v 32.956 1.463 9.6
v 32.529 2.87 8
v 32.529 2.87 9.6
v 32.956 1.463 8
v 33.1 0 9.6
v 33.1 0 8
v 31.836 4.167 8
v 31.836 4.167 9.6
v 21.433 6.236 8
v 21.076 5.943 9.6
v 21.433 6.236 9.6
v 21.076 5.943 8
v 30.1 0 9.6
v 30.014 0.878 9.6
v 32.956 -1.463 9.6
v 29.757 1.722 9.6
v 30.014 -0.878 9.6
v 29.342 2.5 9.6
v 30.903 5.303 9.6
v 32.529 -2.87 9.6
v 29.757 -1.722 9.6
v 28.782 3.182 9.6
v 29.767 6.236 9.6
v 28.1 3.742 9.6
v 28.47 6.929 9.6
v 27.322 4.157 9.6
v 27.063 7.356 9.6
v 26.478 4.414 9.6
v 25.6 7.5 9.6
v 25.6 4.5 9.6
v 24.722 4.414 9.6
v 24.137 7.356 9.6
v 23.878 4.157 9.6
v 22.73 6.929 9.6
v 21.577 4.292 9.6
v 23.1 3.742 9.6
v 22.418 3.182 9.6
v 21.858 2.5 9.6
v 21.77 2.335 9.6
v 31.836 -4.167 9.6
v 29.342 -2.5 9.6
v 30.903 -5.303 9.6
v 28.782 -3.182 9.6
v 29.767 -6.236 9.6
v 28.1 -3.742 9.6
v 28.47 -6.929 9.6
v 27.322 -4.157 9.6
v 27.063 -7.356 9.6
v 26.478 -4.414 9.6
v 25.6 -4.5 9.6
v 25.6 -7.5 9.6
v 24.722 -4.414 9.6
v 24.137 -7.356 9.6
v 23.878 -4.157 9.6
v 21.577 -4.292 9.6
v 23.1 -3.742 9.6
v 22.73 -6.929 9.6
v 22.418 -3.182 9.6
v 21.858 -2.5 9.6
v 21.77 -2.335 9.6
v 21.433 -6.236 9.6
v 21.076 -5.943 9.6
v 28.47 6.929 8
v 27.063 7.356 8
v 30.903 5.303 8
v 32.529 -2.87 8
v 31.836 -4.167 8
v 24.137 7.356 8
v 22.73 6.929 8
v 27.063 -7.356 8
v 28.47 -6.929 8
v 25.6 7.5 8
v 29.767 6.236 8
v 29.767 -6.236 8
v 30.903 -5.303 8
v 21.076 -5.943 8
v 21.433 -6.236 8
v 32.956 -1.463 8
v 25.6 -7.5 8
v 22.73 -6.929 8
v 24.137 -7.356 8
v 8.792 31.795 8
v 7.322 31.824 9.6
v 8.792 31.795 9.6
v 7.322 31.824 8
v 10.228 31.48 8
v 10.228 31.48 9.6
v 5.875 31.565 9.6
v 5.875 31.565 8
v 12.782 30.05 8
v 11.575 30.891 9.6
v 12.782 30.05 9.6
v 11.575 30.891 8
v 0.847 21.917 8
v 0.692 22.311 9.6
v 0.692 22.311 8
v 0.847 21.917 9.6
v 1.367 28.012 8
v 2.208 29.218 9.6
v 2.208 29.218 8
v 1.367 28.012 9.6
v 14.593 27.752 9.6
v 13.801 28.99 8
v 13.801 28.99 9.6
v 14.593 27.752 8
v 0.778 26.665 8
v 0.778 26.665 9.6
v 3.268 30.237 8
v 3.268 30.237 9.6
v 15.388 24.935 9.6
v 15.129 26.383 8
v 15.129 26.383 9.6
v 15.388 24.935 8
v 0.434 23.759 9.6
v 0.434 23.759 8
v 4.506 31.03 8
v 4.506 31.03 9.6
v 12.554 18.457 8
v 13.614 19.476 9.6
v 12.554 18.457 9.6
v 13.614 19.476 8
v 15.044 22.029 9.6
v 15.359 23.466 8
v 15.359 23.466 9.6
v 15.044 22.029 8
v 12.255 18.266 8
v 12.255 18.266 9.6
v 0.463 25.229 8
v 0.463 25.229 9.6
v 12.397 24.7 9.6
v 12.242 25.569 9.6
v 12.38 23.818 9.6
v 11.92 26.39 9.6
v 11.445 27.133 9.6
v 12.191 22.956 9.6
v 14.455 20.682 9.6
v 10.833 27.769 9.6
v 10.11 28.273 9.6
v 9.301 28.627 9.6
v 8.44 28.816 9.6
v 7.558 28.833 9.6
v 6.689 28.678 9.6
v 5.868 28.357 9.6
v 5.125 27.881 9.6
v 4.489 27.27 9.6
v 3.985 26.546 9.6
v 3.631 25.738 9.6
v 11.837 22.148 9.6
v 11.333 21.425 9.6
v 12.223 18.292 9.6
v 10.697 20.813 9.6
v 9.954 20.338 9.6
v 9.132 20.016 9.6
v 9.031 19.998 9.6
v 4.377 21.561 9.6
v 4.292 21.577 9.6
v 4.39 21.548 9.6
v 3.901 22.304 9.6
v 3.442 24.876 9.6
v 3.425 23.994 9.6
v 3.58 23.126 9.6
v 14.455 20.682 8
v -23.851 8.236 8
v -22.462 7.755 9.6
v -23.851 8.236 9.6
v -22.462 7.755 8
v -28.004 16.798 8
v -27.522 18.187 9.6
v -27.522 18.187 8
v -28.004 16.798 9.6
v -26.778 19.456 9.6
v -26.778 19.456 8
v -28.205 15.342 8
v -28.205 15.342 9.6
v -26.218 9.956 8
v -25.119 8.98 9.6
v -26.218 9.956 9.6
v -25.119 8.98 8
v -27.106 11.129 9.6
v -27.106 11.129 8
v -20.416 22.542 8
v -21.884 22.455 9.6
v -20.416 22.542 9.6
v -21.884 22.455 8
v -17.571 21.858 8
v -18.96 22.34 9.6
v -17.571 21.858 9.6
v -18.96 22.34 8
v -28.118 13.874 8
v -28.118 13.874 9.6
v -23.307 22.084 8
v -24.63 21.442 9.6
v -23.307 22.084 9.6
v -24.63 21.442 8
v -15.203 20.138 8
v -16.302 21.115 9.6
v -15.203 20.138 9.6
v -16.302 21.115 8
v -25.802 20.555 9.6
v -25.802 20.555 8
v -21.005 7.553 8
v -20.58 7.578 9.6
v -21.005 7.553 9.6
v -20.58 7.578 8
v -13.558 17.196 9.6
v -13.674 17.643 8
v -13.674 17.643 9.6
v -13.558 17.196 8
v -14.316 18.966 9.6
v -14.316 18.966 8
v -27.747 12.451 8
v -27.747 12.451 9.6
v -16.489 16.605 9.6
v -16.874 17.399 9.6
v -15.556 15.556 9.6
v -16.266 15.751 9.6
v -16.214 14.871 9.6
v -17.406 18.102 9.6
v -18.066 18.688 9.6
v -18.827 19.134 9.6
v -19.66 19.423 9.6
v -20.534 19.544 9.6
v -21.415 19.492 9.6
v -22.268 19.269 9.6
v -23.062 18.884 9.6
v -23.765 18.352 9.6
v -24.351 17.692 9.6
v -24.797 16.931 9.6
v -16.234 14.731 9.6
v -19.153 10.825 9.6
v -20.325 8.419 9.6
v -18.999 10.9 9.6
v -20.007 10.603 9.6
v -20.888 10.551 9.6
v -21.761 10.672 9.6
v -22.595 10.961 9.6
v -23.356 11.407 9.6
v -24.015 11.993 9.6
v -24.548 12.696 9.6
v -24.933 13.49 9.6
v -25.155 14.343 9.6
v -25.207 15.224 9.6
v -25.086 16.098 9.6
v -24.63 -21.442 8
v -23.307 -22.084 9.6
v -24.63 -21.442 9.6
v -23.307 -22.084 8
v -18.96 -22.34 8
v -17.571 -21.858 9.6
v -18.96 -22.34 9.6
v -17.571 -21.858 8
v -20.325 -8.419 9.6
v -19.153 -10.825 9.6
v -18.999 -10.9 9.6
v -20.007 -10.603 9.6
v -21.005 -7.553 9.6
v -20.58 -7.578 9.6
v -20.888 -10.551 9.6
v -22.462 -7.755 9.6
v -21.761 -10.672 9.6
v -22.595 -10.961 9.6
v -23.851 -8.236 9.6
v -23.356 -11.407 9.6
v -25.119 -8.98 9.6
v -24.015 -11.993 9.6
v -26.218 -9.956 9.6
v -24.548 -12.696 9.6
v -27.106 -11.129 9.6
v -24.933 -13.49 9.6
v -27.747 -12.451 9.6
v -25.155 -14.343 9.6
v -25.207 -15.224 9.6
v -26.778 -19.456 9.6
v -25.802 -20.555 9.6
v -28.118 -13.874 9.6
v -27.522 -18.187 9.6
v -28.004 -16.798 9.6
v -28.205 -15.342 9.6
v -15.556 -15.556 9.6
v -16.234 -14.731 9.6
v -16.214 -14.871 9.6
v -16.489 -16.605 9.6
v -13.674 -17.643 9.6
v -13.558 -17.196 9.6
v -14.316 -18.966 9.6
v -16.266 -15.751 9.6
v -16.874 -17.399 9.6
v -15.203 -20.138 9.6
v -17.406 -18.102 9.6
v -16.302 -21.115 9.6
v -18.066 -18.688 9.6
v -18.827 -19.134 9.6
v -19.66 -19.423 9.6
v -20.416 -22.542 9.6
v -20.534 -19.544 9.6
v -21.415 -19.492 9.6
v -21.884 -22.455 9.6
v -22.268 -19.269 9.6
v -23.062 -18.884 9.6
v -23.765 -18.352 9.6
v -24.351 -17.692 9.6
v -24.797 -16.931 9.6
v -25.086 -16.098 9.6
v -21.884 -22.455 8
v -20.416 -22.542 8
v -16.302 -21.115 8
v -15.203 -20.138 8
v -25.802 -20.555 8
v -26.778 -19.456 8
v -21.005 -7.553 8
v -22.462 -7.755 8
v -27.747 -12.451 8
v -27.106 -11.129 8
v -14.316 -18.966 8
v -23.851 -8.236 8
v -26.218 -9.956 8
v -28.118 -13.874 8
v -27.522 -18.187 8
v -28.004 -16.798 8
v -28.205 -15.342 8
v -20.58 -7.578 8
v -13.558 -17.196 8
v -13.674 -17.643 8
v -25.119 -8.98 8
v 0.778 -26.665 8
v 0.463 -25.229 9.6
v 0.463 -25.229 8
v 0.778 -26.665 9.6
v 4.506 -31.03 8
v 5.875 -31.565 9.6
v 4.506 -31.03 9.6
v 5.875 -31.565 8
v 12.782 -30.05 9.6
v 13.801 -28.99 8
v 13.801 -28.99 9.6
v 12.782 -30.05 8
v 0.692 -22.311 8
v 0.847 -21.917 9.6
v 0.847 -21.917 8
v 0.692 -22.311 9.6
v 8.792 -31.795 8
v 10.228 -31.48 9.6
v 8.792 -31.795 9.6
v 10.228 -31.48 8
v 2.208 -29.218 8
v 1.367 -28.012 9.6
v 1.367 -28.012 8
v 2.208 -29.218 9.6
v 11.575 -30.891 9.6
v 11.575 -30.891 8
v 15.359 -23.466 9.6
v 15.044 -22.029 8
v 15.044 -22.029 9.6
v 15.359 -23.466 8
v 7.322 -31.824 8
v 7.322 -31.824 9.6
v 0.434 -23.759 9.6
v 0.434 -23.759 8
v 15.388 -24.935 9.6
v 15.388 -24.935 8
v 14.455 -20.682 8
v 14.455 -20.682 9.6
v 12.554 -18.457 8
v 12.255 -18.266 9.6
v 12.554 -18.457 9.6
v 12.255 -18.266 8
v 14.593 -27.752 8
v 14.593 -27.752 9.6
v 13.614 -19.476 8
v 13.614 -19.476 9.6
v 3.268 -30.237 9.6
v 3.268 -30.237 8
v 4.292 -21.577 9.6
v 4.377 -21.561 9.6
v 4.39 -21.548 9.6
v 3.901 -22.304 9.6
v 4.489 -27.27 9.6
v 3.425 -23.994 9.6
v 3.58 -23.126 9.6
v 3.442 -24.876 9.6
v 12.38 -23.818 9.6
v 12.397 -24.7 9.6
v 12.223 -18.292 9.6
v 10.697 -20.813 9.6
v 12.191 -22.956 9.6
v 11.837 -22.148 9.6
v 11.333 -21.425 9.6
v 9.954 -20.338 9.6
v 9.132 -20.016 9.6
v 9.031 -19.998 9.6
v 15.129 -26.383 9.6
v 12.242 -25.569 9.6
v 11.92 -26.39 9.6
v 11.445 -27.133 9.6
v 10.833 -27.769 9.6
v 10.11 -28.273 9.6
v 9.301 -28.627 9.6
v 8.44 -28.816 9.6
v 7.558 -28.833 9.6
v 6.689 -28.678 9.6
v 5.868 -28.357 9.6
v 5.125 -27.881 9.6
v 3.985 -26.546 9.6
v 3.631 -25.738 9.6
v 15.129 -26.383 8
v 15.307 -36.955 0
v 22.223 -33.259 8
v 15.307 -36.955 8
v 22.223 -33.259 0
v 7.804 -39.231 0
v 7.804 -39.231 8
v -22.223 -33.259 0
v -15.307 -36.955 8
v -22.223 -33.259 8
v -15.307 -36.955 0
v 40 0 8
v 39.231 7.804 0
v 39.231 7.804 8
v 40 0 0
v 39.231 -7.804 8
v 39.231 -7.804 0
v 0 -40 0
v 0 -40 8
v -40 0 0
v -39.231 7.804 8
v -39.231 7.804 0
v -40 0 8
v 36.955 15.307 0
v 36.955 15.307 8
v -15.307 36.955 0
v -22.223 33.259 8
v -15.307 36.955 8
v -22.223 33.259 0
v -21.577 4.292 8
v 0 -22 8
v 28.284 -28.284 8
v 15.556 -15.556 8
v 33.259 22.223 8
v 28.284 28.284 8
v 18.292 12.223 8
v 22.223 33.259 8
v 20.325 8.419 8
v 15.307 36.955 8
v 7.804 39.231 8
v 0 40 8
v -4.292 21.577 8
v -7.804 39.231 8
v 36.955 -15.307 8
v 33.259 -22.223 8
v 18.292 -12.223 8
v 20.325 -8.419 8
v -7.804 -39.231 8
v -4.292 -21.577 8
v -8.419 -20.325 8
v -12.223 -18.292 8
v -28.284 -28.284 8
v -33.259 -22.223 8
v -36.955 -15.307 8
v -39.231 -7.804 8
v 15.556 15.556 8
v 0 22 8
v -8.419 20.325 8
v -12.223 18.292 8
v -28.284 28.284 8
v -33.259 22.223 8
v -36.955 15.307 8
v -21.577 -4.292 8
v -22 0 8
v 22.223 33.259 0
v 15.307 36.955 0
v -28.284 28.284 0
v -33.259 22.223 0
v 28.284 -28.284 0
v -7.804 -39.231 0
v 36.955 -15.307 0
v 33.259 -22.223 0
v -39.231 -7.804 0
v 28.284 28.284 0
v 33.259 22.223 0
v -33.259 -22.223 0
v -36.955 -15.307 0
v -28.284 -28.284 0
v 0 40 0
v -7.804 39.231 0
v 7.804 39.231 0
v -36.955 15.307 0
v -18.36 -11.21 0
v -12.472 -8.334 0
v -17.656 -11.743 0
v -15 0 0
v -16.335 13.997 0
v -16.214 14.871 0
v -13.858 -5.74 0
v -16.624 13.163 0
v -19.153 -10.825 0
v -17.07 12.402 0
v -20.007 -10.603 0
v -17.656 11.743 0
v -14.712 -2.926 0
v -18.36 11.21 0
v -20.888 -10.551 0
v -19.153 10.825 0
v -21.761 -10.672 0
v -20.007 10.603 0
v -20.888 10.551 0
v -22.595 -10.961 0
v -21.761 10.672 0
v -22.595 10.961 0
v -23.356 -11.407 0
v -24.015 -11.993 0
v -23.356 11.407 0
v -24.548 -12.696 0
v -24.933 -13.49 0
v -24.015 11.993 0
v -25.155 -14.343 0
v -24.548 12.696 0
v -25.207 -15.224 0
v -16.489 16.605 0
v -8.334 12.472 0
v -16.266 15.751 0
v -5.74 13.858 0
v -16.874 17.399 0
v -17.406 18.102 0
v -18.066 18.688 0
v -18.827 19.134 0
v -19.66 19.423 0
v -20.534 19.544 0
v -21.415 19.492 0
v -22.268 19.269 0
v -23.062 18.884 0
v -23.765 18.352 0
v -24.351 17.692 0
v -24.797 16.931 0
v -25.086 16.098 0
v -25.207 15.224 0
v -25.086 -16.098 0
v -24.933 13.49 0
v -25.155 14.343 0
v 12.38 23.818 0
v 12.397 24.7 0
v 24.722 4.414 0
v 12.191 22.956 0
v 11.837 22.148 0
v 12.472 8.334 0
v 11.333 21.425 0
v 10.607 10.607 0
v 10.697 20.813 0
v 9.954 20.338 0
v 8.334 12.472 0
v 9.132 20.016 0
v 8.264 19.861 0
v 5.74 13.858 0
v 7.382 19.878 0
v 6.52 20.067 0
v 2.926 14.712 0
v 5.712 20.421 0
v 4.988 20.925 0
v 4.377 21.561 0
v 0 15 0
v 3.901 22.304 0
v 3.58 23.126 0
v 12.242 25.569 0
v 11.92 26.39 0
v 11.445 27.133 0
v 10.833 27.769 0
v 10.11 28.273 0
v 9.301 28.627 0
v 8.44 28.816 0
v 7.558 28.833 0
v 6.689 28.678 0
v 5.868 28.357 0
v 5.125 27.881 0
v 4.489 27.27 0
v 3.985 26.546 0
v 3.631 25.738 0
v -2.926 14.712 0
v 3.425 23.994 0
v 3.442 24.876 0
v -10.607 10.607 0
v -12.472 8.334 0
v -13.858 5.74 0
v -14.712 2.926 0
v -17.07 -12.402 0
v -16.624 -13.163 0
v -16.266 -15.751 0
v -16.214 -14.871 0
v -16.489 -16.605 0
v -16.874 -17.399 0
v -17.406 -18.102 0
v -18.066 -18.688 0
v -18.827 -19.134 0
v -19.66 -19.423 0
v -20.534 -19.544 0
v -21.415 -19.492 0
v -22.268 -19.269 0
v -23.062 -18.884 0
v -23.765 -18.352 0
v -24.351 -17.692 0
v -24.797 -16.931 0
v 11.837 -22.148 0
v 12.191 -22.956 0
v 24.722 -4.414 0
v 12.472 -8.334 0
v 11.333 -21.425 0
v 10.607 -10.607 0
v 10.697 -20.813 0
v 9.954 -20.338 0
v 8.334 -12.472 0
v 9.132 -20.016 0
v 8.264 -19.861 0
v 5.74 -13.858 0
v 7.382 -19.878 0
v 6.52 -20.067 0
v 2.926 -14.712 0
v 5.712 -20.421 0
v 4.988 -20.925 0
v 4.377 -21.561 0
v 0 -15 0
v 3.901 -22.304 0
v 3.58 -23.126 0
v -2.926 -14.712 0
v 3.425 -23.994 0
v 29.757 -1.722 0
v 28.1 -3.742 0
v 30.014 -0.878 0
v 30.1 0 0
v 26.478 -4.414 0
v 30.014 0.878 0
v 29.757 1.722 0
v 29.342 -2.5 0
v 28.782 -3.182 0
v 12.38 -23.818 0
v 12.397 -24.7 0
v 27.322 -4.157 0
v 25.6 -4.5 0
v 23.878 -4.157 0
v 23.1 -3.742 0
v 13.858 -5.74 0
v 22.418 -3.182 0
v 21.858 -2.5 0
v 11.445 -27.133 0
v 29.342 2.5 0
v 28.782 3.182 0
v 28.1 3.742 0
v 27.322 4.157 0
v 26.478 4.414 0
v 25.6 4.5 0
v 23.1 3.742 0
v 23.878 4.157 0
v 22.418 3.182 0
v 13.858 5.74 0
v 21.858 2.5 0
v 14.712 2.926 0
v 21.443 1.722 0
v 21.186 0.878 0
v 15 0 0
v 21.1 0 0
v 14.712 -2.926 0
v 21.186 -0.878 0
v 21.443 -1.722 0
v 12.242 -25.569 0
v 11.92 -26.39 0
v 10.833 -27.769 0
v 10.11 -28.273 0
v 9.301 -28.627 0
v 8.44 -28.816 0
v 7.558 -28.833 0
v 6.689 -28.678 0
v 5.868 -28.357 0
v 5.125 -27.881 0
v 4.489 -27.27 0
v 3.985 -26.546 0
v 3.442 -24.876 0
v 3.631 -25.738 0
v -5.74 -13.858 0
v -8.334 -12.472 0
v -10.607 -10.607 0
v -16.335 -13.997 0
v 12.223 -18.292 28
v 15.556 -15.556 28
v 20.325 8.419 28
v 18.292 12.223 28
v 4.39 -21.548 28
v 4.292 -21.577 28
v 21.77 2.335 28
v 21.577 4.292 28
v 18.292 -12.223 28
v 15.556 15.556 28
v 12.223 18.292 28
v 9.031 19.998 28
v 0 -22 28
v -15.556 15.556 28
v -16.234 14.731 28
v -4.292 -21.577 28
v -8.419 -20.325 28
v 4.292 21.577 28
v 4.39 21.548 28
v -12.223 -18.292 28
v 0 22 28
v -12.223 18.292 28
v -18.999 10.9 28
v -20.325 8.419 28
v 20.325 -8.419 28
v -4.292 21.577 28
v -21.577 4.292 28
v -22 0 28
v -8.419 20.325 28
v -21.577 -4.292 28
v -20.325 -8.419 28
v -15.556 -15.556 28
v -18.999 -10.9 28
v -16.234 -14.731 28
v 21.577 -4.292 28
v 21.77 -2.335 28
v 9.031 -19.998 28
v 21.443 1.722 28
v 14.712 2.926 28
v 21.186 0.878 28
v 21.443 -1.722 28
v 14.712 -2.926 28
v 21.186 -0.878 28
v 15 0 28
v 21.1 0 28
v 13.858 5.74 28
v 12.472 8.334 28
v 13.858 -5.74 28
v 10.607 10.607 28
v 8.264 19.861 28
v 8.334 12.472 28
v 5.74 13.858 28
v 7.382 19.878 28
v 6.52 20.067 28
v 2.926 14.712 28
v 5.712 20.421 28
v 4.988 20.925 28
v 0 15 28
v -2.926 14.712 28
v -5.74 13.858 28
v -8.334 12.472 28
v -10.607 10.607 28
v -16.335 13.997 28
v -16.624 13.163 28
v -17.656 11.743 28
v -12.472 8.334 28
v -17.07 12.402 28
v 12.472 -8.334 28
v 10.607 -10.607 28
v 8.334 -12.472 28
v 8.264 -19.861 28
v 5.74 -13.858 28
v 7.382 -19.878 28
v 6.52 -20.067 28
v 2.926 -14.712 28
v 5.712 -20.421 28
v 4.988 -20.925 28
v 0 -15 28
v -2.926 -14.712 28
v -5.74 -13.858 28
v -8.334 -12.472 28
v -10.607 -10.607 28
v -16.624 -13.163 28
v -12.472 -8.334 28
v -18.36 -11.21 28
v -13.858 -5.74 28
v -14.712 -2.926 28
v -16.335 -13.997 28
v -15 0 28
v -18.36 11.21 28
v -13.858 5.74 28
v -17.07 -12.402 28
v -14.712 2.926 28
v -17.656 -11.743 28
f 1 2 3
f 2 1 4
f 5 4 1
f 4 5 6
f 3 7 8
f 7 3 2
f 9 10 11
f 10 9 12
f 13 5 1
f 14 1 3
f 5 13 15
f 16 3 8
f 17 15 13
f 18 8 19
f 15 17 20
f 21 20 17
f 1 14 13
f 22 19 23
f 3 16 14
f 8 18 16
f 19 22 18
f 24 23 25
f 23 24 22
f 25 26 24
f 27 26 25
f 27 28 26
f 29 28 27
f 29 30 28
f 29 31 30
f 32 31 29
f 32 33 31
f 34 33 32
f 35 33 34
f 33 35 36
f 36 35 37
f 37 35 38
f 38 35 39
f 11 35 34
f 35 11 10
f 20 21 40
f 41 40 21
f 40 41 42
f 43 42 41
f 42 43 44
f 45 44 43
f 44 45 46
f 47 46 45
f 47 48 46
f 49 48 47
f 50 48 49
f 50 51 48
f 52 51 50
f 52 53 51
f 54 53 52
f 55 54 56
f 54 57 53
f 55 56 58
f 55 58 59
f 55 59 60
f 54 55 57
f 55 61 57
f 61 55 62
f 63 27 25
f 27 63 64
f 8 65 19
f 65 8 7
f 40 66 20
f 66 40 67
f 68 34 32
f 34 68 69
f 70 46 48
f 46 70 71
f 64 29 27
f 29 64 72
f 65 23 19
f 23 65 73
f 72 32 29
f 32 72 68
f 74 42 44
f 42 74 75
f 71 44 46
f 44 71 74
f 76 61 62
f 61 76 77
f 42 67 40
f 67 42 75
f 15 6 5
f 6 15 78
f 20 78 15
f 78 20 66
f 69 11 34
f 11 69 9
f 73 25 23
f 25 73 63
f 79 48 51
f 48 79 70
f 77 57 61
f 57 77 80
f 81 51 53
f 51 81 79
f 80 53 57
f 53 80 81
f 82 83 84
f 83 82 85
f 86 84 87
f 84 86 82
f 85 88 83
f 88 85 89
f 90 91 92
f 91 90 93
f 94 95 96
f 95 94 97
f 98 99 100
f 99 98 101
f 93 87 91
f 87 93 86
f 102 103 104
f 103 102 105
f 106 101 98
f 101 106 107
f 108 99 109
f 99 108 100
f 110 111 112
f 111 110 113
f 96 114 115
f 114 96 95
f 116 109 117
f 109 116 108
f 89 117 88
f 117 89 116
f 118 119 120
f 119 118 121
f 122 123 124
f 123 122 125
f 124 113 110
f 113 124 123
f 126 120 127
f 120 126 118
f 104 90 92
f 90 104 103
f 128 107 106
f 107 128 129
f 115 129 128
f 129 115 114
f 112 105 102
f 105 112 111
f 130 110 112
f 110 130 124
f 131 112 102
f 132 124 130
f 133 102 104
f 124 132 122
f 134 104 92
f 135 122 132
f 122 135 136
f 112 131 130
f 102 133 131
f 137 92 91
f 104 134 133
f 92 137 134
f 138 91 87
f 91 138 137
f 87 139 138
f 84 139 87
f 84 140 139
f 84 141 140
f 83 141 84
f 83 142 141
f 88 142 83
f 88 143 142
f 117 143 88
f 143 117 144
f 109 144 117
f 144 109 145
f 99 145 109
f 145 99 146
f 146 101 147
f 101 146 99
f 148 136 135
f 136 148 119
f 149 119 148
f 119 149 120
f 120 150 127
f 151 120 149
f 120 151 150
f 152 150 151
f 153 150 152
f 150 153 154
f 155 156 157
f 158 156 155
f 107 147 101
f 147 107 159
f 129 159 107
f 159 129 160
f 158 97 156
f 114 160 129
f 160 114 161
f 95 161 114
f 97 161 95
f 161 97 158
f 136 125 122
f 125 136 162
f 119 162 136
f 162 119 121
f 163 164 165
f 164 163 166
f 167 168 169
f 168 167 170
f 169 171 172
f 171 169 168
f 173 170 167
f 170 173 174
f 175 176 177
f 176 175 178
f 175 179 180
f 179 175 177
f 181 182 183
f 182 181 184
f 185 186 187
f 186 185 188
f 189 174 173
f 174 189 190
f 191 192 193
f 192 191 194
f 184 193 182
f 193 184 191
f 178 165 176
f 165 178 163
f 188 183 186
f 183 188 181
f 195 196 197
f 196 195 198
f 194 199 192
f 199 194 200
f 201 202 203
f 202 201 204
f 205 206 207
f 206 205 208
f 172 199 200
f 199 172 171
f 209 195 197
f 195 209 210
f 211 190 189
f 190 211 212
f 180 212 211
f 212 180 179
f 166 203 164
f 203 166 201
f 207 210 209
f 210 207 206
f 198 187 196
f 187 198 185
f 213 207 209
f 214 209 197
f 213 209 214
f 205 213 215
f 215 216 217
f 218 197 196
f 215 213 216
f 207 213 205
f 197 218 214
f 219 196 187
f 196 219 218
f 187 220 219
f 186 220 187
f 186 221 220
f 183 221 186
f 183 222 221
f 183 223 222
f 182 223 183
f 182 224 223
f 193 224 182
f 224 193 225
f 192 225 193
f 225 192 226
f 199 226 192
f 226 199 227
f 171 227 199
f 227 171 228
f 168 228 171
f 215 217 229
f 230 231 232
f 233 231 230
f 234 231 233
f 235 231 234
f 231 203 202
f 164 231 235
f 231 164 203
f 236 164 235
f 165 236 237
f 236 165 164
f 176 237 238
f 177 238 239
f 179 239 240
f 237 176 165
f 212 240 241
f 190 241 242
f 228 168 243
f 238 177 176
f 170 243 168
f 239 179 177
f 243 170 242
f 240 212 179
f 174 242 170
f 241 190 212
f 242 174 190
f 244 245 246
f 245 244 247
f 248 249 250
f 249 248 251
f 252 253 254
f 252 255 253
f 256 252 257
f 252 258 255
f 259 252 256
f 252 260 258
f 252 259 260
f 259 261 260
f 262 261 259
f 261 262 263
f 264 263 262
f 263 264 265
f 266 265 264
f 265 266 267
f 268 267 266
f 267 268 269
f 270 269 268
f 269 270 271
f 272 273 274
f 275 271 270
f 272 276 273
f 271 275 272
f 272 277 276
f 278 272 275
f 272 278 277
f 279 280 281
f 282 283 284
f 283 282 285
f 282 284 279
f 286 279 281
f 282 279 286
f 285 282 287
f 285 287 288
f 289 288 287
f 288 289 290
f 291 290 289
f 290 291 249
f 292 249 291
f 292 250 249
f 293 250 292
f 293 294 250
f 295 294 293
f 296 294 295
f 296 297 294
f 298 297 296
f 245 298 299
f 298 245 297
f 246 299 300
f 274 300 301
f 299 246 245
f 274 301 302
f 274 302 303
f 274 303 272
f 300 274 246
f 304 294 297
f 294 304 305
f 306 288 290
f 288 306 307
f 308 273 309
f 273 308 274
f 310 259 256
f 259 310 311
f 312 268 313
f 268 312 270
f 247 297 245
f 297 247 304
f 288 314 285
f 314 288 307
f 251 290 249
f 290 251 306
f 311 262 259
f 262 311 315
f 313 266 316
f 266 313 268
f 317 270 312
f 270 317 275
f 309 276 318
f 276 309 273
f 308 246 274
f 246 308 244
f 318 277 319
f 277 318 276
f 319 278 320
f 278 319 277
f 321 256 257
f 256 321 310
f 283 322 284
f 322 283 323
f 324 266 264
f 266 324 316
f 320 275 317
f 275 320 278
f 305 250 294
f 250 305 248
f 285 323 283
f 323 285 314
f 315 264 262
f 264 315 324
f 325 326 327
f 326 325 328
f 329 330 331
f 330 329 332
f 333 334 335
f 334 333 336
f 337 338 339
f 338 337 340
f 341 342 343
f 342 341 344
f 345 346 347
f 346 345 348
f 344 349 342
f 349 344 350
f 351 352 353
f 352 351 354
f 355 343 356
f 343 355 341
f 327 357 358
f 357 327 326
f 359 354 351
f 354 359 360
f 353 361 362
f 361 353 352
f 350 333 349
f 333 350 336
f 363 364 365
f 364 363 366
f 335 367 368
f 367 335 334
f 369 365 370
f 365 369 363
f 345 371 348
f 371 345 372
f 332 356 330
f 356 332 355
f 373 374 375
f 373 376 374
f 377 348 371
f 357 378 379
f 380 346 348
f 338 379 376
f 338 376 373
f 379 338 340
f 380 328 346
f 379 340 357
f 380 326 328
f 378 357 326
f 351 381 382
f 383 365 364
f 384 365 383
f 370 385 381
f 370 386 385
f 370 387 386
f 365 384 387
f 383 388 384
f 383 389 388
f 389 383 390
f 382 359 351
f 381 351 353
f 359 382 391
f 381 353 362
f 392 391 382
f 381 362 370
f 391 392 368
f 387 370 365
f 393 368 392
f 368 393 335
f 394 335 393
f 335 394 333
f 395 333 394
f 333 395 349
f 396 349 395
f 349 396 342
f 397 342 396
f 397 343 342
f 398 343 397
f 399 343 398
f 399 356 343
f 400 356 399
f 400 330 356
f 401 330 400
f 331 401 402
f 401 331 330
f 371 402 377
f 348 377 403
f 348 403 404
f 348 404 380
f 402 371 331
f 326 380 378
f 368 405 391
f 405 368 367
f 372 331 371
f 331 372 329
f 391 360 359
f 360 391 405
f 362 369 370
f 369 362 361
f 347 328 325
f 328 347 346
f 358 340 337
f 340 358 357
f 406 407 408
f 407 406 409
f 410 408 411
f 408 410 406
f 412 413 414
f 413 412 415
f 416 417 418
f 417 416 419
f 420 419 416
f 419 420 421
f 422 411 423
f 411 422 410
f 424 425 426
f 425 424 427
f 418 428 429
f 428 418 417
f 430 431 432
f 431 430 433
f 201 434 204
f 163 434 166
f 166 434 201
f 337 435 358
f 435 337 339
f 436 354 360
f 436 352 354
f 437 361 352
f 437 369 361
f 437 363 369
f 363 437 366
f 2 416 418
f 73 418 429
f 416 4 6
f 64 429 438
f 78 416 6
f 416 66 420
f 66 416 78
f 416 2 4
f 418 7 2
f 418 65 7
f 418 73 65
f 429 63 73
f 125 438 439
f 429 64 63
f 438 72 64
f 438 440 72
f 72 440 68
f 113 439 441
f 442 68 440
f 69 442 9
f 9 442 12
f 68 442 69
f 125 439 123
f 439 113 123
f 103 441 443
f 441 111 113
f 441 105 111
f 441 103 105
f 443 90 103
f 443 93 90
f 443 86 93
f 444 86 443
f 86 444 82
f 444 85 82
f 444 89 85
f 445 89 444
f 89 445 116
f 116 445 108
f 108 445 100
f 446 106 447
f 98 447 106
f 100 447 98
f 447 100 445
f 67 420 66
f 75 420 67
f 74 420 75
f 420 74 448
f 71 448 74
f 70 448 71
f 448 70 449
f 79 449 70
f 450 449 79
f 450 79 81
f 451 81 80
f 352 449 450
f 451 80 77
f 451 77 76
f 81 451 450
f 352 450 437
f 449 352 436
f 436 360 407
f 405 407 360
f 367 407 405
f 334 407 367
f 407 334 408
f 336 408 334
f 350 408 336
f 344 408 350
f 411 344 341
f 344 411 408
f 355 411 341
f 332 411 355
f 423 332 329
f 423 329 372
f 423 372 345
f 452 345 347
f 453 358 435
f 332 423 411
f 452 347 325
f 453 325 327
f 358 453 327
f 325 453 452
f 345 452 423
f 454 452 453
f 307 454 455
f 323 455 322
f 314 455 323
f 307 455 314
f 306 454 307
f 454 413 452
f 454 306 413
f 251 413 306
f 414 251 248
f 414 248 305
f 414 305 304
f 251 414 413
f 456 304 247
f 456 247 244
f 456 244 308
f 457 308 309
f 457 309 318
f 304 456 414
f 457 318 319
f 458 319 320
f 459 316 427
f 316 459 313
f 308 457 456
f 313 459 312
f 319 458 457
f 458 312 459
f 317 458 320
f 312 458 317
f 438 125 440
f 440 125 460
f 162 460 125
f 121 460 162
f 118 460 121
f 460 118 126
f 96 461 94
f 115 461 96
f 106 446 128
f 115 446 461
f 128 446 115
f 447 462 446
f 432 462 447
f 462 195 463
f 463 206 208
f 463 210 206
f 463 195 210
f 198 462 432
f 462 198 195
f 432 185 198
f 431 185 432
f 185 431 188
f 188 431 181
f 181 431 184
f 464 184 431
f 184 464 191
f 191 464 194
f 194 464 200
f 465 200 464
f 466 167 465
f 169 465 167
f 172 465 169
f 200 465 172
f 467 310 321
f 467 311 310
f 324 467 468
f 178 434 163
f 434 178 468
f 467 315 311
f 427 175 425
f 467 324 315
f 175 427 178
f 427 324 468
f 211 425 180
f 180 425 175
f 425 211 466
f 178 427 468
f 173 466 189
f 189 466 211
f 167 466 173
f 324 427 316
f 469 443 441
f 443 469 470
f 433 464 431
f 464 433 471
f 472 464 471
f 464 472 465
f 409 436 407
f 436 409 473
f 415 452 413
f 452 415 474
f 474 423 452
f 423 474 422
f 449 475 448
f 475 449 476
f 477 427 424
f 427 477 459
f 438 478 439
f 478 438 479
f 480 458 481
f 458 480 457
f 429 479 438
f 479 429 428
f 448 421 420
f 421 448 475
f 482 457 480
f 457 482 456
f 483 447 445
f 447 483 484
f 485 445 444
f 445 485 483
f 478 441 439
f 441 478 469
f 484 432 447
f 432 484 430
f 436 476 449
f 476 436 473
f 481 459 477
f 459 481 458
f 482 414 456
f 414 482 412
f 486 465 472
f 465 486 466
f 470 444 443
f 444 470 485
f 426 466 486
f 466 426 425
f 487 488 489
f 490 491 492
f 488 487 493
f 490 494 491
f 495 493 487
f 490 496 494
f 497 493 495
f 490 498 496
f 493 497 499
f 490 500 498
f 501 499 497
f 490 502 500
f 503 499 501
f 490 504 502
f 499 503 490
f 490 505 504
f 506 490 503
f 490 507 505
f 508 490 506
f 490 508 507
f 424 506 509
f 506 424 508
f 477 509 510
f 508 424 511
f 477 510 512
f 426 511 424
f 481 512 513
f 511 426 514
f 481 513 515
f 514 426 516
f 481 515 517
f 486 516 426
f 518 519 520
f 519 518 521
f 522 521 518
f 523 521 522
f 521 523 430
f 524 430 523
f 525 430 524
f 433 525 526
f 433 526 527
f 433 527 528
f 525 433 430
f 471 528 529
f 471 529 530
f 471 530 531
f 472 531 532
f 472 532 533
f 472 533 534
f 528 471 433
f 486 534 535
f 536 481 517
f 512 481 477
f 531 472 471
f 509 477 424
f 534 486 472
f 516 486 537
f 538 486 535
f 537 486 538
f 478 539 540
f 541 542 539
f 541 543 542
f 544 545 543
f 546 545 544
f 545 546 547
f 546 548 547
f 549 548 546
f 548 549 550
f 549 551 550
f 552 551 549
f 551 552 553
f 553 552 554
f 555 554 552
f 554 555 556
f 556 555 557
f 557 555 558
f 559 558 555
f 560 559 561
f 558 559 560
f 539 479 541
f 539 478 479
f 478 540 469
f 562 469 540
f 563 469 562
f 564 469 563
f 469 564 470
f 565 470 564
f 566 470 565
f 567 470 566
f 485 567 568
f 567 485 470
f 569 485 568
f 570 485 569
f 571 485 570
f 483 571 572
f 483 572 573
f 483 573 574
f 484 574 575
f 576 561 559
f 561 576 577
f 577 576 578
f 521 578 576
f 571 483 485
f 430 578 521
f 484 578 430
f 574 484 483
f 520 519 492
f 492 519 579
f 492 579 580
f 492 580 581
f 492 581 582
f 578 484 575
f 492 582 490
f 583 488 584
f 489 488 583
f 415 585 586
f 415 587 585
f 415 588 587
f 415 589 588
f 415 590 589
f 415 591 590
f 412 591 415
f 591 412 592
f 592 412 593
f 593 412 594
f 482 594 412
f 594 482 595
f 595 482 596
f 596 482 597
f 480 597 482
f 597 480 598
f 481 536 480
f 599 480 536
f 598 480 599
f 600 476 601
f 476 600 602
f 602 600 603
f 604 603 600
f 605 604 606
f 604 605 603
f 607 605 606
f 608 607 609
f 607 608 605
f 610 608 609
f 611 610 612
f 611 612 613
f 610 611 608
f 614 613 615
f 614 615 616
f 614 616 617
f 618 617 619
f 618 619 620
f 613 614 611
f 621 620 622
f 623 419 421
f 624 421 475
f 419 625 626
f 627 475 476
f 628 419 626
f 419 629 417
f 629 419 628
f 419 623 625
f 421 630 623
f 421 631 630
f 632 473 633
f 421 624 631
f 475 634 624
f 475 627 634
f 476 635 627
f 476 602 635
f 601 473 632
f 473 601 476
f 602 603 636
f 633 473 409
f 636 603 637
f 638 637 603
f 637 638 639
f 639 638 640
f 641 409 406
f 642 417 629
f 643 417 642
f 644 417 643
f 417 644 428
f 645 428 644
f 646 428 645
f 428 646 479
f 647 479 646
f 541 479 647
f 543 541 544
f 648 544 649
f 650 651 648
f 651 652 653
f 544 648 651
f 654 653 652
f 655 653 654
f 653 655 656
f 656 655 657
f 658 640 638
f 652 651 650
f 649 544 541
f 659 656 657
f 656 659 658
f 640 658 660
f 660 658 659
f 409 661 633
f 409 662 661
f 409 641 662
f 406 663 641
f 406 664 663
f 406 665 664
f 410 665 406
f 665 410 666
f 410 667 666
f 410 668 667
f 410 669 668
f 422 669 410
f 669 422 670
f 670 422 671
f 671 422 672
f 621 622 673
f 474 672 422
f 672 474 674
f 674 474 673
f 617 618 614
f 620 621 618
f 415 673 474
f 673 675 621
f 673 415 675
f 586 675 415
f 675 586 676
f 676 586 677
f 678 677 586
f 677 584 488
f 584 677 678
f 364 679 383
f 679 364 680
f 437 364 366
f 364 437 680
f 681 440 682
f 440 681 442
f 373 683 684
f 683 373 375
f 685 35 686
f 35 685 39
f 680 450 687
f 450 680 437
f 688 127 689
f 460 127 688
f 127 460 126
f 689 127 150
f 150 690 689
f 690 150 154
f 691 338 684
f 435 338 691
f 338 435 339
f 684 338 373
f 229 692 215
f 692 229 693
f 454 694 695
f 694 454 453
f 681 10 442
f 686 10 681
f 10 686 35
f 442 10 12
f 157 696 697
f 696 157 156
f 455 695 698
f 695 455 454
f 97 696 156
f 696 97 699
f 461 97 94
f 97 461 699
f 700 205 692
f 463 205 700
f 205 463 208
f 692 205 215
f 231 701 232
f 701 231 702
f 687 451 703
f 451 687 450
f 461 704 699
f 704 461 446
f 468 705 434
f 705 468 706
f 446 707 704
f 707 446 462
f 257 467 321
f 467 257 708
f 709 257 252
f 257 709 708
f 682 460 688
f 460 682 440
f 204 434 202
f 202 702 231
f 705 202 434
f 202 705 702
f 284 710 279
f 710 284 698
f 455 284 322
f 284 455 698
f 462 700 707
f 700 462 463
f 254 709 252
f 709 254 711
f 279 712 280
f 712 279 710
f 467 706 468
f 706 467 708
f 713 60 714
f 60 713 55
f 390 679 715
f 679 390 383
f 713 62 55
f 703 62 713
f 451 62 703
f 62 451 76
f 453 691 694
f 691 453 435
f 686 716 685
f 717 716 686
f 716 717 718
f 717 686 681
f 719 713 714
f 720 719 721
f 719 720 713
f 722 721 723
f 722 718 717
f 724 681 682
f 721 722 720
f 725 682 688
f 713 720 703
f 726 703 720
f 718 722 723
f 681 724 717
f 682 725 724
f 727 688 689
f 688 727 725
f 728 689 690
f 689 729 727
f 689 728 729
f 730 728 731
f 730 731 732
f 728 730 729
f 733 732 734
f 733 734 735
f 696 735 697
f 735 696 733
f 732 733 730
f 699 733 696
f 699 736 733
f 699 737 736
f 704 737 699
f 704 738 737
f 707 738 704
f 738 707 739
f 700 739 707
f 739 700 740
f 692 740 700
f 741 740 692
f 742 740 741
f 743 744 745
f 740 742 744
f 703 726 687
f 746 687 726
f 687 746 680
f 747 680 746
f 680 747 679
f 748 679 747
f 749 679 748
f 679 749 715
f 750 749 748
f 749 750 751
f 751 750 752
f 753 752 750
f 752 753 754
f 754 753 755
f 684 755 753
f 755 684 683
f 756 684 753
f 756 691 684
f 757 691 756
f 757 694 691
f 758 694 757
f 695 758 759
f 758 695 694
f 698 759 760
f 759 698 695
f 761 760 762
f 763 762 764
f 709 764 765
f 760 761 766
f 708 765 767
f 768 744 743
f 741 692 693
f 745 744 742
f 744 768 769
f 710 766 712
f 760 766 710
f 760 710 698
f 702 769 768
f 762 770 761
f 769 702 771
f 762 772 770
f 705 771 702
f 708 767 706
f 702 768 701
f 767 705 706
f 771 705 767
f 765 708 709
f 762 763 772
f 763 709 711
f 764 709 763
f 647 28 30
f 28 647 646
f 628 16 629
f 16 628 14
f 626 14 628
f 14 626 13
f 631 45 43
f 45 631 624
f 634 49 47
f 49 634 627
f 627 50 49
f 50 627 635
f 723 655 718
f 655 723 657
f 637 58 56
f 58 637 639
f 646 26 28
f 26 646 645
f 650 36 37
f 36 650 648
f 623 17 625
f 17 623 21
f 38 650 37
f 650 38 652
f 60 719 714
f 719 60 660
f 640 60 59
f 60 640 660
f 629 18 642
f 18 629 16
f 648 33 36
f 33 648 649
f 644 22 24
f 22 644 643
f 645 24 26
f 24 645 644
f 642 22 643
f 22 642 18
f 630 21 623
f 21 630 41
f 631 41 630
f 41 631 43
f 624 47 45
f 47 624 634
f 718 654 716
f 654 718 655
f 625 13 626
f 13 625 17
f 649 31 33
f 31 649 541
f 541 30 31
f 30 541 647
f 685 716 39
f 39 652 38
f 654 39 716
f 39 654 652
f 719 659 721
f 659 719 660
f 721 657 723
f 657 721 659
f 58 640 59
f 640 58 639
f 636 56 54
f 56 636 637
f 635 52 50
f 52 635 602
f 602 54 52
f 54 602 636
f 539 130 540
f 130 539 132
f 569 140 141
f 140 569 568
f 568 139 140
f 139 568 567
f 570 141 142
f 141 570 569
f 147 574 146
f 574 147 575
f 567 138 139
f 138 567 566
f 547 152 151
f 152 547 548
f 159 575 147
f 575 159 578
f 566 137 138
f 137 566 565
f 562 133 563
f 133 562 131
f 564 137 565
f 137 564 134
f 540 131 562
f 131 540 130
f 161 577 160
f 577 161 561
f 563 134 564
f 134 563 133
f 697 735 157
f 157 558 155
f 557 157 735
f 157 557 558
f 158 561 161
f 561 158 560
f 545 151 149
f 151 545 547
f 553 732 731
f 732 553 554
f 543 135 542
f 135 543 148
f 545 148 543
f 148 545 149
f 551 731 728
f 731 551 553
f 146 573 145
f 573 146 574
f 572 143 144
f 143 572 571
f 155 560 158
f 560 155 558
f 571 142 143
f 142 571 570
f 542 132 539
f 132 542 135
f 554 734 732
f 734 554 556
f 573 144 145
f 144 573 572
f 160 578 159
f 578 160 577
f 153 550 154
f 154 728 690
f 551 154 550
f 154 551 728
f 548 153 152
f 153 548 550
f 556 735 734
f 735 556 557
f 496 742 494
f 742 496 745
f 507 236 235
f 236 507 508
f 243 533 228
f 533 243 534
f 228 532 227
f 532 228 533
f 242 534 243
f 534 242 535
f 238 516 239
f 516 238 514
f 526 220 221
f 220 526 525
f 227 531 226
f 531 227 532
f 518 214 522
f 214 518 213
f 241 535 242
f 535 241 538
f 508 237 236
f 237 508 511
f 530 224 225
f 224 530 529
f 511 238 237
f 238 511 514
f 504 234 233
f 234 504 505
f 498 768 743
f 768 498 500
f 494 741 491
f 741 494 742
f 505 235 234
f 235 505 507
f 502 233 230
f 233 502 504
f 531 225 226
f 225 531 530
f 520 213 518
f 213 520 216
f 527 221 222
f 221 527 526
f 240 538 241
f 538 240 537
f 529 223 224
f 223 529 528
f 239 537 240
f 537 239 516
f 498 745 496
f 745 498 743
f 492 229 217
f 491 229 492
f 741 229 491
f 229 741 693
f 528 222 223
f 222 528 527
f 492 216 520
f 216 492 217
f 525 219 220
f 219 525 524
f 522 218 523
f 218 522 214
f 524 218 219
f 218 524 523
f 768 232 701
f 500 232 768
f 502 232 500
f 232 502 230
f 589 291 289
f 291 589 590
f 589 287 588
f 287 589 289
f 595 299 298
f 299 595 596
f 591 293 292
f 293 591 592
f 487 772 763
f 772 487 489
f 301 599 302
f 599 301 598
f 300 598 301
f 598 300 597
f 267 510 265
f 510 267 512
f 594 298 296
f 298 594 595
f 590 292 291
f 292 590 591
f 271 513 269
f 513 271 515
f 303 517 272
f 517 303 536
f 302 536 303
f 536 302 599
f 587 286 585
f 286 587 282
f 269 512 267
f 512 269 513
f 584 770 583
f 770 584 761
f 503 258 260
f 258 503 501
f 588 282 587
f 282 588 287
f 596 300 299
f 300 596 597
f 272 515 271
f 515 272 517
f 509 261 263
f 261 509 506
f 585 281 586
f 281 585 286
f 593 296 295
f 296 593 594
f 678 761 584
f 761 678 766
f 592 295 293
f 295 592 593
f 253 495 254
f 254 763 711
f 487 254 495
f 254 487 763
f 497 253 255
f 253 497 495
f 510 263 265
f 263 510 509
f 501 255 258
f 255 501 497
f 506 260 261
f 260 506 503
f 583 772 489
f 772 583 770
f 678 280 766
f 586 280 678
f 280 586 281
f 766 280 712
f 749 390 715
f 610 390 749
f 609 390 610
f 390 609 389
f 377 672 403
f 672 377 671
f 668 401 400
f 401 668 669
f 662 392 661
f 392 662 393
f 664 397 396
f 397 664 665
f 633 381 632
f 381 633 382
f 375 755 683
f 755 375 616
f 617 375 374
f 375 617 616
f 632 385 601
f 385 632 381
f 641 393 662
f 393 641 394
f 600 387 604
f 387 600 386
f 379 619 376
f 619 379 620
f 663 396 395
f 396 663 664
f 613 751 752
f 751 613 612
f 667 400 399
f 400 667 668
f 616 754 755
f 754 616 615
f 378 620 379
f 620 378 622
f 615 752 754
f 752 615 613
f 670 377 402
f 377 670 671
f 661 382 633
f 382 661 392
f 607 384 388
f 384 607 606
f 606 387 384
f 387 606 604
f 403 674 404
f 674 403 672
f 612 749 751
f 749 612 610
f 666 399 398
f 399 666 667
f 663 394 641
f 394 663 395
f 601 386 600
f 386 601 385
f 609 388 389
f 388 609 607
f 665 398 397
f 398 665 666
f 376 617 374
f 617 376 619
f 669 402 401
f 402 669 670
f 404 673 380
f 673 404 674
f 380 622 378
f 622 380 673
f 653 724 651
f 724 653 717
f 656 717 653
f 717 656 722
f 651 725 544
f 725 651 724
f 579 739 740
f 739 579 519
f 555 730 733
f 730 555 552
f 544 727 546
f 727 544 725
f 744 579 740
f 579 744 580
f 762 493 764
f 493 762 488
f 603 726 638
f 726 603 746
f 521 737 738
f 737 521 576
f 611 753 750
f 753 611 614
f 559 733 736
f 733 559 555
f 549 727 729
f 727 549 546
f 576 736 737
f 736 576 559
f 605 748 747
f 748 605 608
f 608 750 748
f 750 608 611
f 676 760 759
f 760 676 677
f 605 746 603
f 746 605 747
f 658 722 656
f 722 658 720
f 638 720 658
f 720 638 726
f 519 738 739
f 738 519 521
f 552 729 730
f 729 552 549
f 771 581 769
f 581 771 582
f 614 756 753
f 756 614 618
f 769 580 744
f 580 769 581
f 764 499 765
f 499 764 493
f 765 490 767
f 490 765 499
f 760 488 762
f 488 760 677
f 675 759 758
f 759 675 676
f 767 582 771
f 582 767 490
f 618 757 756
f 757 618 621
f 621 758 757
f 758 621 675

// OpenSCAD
$fn = 32;

// ----------------------------------------------------------------------
// Bolt-circle flange: 80 mm outside, 5 bolt holes, bore 30 mm
// ----------------------------------------------------------------------

// --- parameters (mm) ---
flange_d = 80;            // flange outside diameter
flange_t = 8;             // flange thickness
bolts = 5;                // number of bolt holes
bolt_d = 9;               // bolt clearance
bolt_r = 25.6;            // bolt circle radius
bore_d = 30;              // centre bore
hub_d = 44;               // raised hub diameter
hub_h = 20;               // raised hub height
spot_d = 15;              // spot faced bosses
spot_h = 1.6;             // spot face height

module body() {
  cylinder(h = flange_t, d = flange_d);
  /* raised hub, sunk 1 mm into the flange */
  translate([0, 0, flange_t - 1]) cylinder(h = hub_h + 1, d = hub_d);
  /* spot faced pads under the bolt heads */
  for (i = [0 : bolts - 1]) rotate([0, 0, i * 360 / bolts]) translate([bolt_r, 0, flange_t - 1]) cylinder(h = spot_h + 1, d = spot_d);
}

difference() {
  body();
  /* bolt circle */
  for (i = [0 : bolts - 1]) rotate([0, 0, i * 360 / bolts]) translate([bolt_r, 0, -1]) cylinder(h = flange_t + hub_h + 3, d = bolt_d);
  translate([0, 0, -1]) cylinder(h = flange_t + hub_h + 3, d = bore_d);
}
